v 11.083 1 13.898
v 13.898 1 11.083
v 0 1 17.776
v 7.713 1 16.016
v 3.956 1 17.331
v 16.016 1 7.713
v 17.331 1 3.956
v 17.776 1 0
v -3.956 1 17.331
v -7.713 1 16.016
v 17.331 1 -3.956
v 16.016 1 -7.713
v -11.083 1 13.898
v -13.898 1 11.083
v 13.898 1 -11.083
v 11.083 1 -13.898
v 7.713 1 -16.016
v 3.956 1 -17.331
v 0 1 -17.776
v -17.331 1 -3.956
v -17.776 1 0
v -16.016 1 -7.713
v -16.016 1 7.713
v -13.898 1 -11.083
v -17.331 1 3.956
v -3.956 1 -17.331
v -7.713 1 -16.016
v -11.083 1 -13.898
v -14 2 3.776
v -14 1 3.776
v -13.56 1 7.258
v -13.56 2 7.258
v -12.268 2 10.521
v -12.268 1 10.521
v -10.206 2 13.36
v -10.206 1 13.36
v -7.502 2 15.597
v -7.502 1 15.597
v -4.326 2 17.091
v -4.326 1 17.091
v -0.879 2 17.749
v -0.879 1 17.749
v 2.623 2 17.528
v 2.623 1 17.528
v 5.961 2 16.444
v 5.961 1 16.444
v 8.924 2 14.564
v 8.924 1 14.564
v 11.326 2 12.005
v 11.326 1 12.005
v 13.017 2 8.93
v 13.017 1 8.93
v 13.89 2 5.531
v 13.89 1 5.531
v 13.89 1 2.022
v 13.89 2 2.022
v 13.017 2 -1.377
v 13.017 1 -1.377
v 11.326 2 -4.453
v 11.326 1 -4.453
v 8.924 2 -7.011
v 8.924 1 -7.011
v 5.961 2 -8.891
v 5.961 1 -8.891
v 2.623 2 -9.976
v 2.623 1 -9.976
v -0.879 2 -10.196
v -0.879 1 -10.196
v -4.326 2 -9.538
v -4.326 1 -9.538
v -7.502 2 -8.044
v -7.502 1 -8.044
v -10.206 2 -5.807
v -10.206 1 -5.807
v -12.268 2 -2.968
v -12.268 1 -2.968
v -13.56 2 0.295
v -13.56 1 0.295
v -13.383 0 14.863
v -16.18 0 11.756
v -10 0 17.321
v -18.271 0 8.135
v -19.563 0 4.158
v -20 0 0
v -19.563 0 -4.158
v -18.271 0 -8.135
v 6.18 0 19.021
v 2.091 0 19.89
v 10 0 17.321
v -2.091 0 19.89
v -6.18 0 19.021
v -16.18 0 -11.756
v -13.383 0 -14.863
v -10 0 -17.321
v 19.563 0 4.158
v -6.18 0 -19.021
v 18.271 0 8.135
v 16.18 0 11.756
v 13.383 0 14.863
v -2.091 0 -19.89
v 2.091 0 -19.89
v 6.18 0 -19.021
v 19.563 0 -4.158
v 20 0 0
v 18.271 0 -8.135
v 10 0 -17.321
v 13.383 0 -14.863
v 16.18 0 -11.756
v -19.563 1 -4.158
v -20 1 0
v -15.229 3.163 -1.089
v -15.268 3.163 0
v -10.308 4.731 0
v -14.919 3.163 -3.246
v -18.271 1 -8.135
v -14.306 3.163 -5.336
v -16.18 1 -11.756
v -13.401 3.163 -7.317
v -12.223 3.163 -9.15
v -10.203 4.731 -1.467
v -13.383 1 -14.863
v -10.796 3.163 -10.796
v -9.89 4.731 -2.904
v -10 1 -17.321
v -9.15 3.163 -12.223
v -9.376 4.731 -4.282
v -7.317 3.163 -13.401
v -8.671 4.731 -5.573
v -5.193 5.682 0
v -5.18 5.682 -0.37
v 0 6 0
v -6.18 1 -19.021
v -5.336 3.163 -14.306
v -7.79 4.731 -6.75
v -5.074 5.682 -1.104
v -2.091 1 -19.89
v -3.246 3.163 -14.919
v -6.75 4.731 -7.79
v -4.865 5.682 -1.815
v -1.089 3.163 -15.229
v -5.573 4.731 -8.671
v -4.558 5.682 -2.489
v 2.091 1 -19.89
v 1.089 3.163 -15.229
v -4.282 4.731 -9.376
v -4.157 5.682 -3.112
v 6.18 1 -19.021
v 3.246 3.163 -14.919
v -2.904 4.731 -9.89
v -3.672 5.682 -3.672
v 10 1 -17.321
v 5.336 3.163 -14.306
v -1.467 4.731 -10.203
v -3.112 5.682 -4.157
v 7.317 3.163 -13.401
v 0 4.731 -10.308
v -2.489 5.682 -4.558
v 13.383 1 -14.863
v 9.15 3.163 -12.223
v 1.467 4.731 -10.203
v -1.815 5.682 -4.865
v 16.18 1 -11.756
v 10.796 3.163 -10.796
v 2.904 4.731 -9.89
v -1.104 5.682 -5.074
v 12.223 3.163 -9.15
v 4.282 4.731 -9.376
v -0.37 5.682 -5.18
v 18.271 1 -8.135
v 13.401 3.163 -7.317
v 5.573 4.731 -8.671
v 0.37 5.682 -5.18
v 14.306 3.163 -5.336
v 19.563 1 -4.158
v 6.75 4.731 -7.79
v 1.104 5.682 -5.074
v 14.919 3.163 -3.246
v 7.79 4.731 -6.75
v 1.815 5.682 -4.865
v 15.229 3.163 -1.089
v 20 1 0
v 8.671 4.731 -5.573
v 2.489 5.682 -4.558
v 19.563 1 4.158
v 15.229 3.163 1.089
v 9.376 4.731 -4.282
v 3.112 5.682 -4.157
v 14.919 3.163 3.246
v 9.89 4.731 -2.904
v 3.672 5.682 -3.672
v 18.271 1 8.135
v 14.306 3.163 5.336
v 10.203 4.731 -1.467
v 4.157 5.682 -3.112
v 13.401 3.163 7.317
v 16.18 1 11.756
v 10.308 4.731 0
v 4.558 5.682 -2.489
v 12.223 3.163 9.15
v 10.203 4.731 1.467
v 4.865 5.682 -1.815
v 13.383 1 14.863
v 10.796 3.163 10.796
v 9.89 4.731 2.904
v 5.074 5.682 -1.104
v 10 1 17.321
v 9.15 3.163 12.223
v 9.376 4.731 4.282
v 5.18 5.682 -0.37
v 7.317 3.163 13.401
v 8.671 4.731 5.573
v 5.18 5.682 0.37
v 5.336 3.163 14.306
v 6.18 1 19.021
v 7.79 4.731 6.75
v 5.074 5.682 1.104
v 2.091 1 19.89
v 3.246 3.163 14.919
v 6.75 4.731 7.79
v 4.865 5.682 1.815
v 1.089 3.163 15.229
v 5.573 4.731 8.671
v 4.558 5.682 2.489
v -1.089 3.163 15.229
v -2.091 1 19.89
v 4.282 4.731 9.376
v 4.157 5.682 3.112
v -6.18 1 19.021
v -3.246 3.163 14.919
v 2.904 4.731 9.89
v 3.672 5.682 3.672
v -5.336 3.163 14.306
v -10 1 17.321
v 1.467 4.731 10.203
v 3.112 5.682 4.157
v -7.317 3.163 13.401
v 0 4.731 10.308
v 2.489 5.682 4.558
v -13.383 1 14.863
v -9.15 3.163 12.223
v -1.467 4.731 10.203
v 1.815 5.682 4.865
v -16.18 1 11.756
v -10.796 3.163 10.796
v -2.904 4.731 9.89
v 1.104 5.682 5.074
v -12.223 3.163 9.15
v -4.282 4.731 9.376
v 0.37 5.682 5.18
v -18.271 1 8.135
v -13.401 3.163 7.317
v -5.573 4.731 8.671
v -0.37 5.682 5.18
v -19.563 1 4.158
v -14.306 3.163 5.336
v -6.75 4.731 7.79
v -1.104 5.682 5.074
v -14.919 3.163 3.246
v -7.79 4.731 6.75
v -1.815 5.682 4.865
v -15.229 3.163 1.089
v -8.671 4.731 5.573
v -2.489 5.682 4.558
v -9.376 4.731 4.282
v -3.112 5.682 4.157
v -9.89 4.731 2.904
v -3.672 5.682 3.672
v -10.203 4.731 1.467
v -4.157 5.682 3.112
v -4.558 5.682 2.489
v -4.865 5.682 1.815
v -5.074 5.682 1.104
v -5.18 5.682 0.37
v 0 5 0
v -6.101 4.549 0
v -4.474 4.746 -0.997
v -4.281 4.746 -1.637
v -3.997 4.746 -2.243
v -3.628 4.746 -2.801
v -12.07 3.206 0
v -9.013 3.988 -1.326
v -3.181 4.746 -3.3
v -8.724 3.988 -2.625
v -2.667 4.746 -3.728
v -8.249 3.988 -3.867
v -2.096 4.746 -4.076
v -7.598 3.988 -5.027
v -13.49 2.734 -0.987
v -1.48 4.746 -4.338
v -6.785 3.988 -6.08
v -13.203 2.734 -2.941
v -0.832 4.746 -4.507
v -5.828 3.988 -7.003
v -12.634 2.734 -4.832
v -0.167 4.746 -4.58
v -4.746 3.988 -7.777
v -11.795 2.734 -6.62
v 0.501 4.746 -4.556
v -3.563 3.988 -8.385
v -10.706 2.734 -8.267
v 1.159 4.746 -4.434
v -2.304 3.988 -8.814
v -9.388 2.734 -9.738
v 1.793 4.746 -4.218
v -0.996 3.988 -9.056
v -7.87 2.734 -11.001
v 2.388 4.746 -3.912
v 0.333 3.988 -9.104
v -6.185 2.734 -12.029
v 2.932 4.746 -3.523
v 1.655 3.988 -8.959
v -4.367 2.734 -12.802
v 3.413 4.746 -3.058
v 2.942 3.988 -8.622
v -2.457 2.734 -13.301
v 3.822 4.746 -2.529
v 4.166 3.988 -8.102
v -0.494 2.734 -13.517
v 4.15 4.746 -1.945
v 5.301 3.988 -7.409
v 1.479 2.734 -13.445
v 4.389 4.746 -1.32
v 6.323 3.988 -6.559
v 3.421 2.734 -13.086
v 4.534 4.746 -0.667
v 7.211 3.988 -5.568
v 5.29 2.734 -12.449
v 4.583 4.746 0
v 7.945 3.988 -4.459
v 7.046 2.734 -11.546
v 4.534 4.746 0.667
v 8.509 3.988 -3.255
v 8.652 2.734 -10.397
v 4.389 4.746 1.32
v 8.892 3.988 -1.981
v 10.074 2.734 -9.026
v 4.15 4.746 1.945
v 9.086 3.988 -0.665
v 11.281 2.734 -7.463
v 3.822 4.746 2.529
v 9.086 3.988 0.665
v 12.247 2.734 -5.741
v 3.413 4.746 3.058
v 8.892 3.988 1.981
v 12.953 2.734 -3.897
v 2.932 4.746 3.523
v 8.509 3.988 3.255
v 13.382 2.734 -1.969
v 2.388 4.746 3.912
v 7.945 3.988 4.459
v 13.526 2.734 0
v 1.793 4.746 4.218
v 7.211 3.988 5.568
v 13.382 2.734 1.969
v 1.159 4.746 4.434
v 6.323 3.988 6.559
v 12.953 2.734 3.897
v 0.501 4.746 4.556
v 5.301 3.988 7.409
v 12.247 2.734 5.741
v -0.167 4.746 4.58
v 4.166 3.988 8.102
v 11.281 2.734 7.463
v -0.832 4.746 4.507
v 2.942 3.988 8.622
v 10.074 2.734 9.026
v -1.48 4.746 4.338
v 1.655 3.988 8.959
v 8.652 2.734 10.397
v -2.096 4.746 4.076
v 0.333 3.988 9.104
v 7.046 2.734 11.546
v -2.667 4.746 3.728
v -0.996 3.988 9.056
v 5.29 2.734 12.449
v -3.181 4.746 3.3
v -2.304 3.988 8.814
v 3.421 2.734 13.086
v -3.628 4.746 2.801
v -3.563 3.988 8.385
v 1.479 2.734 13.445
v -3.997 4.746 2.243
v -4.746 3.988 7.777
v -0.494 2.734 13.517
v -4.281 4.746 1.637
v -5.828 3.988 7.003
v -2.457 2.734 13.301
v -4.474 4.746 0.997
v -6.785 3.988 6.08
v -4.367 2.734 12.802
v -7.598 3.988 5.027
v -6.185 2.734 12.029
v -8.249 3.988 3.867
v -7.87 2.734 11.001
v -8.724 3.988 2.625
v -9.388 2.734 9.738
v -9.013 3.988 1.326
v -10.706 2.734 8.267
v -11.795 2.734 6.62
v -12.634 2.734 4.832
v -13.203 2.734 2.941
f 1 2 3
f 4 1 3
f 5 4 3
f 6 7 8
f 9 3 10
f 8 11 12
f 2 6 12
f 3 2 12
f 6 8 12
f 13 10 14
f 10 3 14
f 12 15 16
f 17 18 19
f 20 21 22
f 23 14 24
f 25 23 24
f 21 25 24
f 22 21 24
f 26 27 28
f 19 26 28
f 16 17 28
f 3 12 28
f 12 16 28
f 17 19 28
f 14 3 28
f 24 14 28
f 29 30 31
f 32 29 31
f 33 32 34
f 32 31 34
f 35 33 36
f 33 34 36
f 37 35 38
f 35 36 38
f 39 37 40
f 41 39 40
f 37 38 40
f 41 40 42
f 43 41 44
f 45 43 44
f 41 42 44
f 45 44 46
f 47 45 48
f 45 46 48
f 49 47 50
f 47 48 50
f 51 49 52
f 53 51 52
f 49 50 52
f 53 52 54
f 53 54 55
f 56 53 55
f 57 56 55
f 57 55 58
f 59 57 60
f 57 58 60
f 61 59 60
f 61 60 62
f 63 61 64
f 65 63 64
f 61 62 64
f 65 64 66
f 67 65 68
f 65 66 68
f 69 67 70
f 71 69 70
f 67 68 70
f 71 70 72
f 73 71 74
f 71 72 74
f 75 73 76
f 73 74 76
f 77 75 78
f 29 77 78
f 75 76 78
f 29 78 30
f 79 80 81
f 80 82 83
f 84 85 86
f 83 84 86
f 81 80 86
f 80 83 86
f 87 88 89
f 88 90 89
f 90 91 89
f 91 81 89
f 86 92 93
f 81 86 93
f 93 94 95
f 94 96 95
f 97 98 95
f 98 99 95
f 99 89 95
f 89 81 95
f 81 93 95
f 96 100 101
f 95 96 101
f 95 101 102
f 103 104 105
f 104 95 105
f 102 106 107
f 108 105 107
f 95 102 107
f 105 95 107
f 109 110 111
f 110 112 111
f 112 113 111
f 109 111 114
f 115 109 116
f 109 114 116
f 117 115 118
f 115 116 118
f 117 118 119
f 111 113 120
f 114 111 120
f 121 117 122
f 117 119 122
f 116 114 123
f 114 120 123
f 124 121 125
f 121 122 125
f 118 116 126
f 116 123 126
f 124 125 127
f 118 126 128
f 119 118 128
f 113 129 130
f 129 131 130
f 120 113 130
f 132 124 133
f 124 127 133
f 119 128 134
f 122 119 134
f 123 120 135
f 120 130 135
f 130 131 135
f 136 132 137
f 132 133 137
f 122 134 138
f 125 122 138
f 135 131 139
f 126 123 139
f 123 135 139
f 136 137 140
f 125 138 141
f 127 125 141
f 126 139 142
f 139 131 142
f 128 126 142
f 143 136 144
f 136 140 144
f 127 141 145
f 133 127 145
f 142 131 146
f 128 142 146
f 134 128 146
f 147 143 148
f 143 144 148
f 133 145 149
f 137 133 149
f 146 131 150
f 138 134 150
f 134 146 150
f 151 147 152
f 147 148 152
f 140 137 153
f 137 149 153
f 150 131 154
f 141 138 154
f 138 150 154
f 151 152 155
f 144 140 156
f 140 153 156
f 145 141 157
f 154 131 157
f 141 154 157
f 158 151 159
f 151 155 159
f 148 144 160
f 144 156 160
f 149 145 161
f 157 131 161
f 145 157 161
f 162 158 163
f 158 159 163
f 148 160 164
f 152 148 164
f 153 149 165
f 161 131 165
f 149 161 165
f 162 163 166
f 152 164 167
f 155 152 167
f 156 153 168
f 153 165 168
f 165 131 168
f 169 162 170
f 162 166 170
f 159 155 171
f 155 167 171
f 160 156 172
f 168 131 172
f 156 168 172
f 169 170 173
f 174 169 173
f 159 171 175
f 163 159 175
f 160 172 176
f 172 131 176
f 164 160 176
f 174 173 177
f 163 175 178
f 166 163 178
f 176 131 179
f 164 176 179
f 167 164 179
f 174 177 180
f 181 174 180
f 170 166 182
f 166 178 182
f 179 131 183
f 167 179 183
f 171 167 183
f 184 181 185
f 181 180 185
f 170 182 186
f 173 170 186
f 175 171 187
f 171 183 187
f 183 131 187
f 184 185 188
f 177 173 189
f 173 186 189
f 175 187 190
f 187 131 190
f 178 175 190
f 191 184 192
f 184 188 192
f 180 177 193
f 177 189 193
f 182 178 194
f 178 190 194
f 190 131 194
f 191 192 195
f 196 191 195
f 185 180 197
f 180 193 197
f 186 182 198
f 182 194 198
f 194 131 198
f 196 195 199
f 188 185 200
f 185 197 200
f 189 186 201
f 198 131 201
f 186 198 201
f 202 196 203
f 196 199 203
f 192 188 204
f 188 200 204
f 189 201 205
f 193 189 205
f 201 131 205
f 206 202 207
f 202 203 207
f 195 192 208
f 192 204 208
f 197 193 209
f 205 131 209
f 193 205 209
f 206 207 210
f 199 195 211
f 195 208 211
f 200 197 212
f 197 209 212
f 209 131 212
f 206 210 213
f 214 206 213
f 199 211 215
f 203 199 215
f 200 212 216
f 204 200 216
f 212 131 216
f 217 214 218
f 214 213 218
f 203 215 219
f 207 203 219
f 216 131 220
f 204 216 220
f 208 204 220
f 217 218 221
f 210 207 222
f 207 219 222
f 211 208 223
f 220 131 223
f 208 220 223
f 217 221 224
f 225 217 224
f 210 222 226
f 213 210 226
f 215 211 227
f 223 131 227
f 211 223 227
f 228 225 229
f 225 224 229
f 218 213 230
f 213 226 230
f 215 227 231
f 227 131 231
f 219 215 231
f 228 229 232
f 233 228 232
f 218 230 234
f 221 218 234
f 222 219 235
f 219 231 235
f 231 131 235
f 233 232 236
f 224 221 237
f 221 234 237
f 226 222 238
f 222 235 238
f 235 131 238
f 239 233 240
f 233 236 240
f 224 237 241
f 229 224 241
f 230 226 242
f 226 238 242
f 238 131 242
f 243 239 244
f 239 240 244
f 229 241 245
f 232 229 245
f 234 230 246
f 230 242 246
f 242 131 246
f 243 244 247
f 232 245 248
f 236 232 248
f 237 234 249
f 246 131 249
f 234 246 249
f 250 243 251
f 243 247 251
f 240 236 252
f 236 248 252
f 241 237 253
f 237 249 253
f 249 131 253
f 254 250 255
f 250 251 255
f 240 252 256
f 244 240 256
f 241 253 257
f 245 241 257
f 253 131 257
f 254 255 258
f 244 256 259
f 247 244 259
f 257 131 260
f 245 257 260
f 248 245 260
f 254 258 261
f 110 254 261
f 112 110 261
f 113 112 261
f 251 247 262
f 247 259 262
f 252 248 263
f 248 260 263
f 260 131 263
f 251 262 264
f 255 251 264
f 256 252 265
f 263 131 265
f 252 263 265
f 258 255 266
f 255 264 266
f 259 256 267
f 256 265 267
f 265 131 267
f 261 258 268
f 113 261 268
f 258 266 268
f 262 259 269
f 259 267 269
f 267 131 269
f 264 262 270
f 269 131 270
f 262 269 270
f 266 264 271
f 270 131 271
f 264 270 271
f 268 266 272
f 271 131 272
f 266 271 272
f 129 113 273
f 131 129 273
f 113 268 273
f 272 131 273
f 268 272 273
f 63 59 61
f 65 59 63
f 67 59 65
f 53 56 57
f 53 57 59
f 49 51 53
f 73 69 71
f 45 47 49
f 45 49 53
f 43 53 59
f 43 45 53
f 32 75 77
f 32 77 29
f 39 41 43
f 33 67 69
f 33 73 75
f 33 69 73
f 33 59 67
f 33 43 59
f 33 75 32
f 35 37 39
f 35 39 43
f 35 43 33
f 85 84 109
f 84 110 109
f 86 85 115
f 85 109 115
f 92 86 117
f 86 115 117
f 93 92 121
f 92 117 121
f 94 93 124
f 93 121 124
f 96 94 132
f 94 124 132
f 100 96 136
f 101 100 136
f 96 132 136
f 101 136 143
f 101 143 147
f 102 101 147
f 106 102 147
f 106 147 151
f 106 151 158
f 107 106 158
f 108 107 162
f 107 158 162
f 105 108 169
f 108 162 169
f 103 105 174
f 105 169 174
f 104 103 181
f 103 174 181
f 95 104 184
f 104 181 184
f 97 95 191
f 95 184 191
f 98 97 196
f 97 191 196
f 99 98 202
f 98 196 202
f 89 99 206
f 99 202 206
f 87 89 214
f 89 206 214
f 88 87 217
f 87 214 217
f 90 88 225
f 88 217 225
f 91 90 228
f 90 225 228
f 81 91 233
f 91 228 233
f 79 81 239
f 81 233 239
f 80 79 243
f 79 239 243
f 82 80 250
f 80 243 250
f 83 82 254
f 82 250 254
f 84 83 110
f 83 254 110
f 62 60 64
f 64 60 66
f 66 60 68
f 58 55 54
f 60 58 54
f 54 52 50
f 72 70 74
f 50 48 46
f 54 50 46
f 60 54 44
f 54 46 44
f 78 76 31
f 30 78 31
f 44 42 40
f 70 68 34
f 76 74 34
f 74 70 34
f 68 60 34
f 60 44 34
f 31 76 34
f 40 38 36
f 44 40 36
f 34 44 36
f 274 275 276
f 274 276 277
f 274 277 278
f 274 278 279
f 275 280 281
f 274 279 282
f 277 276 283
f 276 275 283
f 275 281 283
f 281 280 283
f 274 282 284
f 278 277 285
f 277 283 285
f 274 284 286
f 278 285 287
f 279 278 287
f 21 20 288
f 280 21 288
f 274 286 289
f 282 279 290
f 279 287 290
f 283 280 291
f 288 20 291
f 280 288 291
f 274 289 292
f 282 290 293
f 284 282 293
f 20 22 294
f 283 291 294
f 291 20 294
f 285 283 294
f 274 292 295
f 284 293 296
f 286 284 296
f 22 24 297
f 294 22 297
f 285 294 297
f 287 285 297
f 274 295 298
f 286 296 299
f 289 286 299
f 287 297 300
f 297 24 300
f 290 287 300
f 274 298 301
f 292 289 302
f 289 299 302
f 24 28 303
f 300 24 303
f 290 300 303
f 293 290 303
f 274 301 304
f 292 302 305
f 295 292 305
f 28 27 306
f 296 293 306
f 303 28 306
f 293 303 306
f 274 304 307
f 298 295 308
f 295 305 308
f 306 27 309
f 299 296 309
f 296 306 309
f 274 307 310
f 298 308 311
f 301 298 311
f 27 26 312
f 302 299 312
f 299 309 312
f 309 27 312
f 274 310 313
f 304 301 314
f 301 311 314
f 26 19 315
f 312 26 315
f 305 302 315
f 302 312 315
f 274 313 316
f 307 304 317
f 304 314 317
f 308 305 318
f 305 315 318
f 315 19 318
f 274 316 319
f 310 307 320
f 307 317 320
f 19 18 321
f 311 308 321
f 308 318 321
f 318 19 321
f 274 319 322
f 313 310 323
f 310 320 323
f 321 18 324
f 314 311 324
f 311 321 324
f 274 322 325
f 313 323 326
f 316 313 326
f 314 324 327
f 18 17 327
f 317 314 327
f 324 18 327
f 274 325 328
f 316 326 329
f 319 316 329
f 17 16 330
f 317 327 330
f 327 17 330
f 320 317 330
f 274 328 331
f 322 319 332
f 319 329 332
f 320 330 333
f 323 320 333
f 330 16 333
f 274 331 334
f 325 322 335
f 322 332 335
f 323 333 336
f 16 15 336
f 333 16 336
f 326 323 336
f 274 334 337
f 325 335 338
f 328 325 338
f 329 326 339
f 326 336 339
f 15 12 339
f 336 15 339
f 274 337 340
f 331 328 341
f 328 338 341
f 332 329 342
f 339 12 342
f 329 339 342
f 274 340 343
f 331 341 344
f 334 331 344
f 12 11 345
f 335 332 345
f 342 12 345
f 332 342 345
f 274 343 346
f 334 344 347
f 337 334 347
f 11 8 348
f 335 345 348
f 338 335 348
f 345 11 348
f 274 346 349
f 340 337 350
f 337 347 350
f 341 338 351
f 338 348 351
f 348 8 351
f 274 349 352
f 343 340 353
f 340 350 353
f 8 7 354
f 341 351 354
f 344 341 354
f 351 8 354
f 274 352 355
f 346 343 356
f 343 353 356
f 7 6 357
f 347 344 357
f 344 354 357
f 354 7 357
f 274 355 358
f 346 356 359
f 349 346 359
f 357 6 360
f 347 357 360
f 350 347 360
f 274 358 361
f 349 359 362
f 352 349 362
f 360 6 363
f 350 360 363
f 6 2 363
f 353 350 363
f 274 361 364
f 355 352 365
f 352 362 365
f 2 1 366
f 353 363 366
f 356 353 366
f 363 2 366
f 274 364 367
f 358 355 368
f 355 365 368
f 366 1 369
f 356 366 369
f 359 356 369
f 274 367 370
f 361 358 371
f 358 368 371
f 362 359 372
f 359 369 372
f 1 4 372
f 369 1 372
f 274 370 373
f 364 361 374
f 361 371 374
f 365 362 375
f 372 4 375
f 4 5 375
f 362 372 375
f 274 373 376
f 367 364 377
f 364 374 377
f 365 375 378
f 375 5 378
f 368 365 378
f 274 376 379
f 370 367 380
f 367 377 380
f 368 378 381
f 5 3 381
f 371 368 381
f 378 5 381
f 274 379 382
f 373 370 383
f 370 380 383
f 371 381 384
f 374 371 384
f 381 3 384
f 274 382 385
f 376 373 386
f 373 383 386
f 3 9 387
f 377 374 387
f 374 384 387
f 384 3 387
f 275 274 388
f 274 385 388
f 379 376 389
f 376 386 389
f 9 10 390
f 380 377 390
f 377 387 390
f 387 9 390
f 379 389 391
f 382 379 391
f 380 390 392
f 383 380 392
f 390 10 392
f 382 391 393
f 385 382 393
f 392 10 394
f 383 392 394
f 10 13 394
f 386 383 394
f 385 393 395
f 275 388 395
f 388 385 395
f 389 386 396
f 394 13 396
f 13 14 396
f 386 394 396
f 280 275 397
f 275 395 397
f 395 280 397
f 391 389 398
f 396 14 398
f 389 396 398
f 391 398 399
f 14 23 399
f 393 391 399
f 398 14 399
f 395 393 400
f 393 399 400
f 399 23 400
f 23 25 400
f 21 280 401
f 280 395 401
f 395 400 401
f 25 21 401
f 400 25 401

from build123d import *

# Parameters (mm, degrees)
SKETCH2_R           = 14
BOSS_EXTRUDE1_DEPTH = 1


with BuildPart() as part:
    # Sketch1 → Revolve1 (revolve)
    with BuildSketch(Plane.XY, mode=Mode.PRIVATE) as revolve1_sk:
        with BuildLine():
            Line((17.776388835, 1), (20, 1))
            ThreePointArc((20, 1), (10.307764064, 4.731056256), (0, 6))
            Line((0, 6), (0, 5))
            ThreePointArc((0, 5), (9.110433579, 3.987652439), (17.776388835, 1))
        make_face()
        Polygon((0, 1), (0, 0), (20, 0), (20, 1), (17.776388835, 1), align=None)
    revolve(revolve1_sk.sketch.rotate(Axis((0, 1, 0), (0, -1, 0)), 180), axis=Axis((0, 1, 0), (0, -1, 0)))


with BuildPart() as body_2:
    # Sketch2 → Boss-Extrude1 (new body)
    with BuildSketch(Plane(origin=(0, 1, 0), x_dir=(1, 0, 0), z_dir=(0, 1, 0))):
        with Locations(Location((0, -3.776388835, 0), (0, 0, 180))):
            Circle(SKETCH2_R)
    extrude(amount=BOSS_EXTRUDE1_DEPTH)


solid = Compound([part.part, body_2.part])
